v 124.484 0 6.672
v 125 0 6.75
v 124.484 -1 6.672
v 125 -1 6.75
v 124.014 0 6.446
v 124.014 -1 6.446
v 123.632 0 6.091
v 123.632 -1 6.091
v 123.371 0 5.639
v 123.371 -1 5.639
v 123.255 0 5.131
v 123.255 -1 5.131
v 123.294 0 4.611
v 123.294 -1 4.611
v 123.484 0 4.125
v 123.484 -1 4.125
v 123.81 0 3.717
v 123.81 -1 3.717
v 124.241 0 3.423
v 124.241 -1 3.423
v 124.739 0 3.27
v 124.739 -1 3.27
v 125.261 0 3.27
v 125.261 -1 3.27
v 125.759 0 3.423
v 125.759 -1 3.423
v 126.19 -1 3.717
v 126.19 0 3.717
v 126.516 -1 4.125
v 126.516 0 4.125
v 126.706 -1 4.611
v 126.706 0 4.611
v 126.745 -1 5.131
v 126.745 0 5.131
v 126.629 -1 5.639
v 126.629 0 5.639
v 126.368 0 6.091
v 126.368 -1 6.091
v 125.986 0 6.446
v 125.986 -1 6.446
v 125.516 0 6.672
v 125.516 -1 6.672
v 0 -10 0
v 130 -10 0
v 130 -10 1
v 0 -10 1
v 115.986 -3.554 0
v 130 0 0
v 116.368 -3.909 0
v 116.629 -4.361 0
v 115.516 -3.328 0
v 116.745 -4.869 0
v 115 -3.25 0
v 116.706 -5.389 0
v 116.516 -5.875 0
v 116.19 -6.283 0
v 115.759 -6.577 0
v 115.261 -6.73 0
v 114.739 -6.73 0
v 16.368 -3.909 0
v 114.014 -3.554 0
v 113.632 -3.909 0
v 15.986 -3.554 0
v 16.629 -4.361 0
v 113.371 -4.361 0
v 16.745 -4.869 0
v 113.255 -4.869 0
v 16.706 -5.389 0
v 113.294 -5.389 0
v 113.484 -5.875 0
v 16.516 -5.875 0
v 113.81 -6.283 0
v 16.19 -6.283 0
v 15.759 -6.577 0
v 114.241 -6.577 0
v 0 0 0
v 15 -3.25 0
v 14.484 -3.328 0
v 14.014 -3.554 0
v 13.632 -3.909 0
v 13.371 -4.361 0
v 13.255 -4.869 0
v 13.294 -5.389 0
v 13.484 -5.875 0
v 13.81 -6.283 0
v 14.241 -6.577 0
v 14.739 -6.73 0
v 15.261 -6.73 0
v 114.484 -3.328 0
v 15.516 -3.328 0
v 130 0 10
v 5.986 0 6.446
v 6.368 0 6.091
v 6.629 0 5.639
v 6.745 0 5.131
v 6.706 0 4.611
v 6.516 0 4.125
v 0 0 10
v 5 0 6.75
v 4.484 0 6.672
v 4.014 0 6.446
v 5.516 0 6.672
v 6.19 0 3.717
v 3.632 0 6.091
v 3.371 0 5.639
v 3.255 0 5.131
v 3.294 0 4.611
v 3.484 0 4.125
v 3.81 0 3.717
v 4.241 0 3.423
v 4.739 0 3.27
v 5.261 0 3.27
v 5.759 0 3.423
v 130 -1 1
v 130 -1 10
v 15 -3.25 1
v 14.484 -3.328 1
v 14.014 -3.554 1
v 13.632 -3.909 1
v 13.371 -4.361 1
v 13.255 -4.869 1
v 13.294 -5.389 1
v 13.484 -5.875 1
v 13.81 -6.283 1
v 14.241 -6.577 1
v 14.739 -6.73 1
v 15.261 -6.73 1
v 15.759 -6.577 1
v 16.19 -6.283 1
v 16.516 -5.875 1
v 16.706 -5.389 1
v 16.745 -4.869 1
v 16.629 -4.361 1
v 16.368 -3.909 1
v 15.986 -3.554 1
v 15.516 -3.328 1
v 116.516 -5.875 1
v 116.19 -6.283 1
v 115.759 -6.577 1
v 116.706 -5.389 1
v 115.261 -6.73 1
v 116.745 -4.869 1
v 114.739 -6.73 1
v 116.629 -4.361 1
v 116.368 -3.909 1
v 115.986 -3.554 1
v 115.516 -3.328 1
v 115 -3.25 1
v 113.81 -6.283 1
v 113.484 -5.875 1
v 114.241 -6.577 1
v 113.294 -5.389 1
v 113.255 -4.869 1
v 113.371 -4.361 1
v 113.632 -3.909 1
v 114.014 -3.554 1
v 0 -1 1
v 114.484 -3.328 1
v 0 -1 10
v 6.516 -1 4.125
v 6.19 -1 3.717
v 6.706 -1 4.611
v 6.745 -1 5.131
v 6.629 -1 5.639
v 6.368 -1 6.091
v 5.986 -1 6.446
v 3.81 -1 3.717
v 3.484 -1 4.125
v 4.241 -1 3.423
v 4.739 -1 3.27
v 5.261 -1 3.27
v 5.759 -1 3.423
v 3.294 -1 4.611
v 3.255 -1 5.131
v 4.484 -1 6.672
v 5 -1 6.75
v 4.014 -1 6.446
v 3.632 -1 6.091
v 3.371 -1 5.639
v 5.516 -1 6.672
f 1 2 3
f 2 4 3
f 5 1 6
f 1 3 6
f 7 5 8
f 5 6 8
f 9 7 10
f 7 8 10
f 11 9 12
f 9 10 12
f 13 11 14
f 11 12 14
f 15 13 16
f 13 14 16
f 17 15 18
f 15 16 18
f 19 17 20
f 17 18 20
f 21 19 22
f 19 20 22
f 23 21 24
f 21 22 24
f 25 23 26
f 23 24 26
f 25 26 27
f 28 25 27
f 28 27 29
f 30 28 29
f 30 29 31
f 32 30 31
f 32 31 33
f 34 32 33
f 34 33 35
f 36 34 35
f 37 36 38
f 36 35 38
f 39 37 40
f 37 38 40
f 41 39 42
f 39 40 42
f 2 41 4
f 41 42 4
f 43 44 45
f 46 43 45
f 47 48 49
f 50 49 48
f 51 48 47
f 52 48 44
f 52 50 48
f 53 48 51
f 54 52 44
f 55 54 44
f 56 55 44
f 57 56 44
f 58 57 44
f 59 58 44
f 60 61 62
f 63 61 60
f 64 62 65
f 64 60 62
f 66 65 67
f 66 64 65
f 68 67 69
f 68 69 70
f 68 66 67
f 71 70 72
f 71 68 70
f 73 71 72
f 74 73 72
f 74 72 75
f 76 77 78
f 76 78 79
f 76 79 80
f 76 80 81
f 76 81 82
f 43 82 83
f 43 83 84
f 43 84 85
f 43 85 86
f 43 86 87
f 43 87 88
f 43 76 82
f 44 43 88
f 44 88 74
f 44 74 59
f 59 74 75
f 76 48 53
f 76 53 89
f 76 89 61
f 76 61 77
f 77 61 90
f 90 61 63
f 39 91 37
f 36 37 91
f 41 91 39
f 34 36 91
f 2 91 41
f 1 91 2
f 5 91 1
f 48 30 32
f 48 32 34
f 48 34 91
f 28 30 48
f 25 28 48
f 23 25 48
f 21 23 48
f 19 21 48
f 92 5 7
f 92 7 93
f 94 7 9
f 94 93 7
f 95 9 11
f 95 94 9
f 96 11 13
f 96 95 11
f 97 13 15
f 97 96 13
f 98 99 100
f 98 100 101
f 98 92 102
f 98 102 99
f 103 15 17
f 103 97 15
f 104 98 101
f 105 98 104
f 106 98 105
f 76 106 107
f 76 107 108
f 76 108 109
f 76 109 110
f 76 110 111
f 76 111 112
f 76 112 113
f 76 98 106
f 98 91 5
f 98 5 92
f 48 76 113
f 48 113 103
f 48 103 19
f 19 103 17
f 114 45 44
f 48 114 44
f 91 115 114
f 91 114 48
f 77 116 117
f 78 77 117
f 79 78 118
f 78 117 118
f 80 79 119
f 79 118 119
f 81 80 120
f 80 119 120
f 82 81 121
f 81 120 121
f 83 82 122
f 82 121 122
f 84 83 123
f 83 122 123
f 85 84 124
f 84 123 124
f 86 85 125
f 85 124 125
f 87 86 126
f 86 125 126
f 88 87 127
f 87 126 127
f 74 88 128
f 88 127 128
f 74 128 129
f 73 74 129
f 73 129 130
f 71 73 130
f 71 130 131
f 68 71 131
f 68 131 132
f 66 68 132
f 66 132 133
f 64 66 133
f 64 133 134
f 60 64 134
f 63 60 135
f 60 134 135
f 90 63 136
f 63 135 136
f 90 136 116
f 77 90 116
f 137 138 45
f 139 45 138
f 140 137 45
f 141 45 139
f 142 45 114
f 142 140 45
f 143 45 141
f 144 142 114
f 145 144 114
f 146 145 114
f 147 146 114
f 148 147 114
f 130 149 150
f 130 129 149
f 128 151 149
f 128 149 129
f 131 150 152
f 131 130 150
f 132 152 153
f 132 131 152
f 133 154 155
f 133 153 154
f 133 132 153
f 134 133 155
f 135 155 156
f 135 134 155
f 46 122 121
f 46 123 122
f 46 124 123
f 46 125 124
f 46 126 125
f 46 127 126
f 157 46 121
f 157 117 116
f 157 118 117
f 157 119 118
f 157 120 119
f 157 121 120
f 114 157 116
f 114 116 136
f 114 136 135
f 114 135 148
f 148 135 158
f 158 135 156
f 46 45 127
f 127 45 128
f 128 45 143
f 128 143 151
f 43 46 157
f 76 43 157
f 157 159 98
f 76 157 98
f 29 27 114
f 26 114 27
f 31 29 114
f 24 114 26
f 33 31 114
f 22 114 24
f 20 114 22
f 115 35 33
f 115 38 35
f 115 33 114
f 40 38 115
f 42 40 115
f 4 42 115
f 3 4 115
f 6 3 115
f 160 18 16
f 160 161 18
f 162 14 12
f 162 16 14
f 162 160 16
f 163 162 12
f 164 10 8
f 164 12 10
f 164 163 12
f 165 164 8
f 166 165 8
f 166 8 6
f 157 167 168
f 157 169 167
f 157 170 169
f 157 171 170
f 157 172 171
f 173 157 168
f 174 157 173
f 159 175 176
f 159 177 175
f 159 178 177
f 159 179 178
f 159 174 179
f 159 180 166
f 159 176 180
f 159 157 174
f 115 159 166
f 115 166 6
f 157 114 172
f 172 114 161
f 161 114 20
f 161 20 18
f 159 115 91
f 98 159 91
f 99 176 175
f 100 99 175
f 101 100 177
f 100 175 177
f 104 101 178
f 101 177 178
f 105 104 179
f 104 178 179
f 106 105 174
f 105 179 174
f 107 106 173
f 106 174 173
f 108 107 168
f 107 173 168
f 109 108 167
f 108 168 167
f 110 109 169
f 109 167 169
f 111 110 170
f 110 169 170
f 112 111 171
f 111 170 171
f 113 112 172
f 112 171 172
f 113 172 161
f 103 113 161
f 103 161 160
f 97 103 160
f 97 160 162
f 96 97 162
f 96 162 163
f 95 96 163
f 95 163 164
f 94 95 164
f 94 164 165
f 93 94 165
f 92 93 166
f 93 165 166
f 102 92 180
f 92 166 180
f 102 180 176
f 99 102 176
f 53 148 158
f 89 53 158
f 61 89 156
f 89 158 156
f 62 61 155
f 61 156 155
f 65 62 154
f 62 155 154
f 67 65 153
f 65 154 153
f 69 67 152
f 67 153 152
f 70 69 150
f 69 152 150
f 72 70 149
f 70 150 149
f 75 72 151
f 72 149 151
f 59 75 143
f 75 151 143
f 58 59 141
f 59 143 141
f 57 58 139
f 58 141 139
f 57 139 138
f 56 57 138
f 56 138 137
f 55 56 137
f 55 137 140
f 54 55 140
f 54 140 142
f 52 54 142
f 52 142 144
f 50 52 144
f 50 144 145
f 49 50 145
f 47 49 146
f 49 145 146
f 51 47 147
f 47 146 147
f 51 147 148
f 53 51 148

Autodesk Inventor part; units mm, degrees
ref_plane "YZ Plane" through (0, 0, 0) normal (1, 0, 0) x (0, 1, 0)
ref_plane "XZ Plane" through (0, 0, 0) normal (0, 1, 0) x (-1, 0, 0)
ref_plane "XY Plane" through (0, 0, 0) normal (0, 0, 1) x (1, 0, 0)
sketch "スケッチ1" plane through (0, 0, 0) normal (1, 0, 0) x (0, 1, 0)
  line L0 (0, 0) -> (-1, 0)
  line L1 (-1, 0) -> (-1, 10)
  line L2 (-1, 10) -> (0, 10)
  line L3 (0, 10) -> (0, 0)
  line L4 (0, 0) -> (-10, 0)
  line L5 (-10, 0) -> (-10, 1)
  line L6 (-10, 1) -> (0, 1)
  line L7 (0, 1) -> (0, 0)
  point P0 (-1, 1)
  dimension "d0" = 1
  dimension "d1" = 10
  dimension "d2" = 10
  dimension "d3" = 1
extrude "押し出し1" add sketch "スケッチ1" along normal blind 130
sketch "スケッチ2" plane through (0, 0, 10) normal (0, 1, 0) x (1, 0, 0)
  line L0 (0, 10) -> (0, 0) projected
  line L1 (0, 10) -> (130, 10) projected
  line L2 (130, 10) -> (130, 0) projected
  point P0 (5, 5)
  point P1 (125, 5)
  dimension "d13" = 5
  dimension "d14" = 5
  dimension "d15" = 5
  dimension "d16" = 5
hole "穴1" at (5, 0, 5) at (125, 0, 5) direction (0, -1, 0) diameter 3.5 end through all
sketch "スケッチ3" plane through (0, -10, 0) normal (0, 0, -1) x (-1, 0, 0)
  line L0 (0, 0) -> (-130, 0) projected
  line L1 (-130, 0) -> (-130, 10) projected
  line L2 (0, 0) -> (0, 10) projected
  point P0 (-115, 5)
  point P1 (-15, 5)
  dimension "d24" = 5
  dimension "d25" = 5
  dimension "d26" = 15
  dimension "d27" = 15
hole "穴2" at (115, -5, 0) at (15, -5, 0) direction (0, 0, 1) diameter 3.5 end through all
properties part number "slide_panel_joint"
